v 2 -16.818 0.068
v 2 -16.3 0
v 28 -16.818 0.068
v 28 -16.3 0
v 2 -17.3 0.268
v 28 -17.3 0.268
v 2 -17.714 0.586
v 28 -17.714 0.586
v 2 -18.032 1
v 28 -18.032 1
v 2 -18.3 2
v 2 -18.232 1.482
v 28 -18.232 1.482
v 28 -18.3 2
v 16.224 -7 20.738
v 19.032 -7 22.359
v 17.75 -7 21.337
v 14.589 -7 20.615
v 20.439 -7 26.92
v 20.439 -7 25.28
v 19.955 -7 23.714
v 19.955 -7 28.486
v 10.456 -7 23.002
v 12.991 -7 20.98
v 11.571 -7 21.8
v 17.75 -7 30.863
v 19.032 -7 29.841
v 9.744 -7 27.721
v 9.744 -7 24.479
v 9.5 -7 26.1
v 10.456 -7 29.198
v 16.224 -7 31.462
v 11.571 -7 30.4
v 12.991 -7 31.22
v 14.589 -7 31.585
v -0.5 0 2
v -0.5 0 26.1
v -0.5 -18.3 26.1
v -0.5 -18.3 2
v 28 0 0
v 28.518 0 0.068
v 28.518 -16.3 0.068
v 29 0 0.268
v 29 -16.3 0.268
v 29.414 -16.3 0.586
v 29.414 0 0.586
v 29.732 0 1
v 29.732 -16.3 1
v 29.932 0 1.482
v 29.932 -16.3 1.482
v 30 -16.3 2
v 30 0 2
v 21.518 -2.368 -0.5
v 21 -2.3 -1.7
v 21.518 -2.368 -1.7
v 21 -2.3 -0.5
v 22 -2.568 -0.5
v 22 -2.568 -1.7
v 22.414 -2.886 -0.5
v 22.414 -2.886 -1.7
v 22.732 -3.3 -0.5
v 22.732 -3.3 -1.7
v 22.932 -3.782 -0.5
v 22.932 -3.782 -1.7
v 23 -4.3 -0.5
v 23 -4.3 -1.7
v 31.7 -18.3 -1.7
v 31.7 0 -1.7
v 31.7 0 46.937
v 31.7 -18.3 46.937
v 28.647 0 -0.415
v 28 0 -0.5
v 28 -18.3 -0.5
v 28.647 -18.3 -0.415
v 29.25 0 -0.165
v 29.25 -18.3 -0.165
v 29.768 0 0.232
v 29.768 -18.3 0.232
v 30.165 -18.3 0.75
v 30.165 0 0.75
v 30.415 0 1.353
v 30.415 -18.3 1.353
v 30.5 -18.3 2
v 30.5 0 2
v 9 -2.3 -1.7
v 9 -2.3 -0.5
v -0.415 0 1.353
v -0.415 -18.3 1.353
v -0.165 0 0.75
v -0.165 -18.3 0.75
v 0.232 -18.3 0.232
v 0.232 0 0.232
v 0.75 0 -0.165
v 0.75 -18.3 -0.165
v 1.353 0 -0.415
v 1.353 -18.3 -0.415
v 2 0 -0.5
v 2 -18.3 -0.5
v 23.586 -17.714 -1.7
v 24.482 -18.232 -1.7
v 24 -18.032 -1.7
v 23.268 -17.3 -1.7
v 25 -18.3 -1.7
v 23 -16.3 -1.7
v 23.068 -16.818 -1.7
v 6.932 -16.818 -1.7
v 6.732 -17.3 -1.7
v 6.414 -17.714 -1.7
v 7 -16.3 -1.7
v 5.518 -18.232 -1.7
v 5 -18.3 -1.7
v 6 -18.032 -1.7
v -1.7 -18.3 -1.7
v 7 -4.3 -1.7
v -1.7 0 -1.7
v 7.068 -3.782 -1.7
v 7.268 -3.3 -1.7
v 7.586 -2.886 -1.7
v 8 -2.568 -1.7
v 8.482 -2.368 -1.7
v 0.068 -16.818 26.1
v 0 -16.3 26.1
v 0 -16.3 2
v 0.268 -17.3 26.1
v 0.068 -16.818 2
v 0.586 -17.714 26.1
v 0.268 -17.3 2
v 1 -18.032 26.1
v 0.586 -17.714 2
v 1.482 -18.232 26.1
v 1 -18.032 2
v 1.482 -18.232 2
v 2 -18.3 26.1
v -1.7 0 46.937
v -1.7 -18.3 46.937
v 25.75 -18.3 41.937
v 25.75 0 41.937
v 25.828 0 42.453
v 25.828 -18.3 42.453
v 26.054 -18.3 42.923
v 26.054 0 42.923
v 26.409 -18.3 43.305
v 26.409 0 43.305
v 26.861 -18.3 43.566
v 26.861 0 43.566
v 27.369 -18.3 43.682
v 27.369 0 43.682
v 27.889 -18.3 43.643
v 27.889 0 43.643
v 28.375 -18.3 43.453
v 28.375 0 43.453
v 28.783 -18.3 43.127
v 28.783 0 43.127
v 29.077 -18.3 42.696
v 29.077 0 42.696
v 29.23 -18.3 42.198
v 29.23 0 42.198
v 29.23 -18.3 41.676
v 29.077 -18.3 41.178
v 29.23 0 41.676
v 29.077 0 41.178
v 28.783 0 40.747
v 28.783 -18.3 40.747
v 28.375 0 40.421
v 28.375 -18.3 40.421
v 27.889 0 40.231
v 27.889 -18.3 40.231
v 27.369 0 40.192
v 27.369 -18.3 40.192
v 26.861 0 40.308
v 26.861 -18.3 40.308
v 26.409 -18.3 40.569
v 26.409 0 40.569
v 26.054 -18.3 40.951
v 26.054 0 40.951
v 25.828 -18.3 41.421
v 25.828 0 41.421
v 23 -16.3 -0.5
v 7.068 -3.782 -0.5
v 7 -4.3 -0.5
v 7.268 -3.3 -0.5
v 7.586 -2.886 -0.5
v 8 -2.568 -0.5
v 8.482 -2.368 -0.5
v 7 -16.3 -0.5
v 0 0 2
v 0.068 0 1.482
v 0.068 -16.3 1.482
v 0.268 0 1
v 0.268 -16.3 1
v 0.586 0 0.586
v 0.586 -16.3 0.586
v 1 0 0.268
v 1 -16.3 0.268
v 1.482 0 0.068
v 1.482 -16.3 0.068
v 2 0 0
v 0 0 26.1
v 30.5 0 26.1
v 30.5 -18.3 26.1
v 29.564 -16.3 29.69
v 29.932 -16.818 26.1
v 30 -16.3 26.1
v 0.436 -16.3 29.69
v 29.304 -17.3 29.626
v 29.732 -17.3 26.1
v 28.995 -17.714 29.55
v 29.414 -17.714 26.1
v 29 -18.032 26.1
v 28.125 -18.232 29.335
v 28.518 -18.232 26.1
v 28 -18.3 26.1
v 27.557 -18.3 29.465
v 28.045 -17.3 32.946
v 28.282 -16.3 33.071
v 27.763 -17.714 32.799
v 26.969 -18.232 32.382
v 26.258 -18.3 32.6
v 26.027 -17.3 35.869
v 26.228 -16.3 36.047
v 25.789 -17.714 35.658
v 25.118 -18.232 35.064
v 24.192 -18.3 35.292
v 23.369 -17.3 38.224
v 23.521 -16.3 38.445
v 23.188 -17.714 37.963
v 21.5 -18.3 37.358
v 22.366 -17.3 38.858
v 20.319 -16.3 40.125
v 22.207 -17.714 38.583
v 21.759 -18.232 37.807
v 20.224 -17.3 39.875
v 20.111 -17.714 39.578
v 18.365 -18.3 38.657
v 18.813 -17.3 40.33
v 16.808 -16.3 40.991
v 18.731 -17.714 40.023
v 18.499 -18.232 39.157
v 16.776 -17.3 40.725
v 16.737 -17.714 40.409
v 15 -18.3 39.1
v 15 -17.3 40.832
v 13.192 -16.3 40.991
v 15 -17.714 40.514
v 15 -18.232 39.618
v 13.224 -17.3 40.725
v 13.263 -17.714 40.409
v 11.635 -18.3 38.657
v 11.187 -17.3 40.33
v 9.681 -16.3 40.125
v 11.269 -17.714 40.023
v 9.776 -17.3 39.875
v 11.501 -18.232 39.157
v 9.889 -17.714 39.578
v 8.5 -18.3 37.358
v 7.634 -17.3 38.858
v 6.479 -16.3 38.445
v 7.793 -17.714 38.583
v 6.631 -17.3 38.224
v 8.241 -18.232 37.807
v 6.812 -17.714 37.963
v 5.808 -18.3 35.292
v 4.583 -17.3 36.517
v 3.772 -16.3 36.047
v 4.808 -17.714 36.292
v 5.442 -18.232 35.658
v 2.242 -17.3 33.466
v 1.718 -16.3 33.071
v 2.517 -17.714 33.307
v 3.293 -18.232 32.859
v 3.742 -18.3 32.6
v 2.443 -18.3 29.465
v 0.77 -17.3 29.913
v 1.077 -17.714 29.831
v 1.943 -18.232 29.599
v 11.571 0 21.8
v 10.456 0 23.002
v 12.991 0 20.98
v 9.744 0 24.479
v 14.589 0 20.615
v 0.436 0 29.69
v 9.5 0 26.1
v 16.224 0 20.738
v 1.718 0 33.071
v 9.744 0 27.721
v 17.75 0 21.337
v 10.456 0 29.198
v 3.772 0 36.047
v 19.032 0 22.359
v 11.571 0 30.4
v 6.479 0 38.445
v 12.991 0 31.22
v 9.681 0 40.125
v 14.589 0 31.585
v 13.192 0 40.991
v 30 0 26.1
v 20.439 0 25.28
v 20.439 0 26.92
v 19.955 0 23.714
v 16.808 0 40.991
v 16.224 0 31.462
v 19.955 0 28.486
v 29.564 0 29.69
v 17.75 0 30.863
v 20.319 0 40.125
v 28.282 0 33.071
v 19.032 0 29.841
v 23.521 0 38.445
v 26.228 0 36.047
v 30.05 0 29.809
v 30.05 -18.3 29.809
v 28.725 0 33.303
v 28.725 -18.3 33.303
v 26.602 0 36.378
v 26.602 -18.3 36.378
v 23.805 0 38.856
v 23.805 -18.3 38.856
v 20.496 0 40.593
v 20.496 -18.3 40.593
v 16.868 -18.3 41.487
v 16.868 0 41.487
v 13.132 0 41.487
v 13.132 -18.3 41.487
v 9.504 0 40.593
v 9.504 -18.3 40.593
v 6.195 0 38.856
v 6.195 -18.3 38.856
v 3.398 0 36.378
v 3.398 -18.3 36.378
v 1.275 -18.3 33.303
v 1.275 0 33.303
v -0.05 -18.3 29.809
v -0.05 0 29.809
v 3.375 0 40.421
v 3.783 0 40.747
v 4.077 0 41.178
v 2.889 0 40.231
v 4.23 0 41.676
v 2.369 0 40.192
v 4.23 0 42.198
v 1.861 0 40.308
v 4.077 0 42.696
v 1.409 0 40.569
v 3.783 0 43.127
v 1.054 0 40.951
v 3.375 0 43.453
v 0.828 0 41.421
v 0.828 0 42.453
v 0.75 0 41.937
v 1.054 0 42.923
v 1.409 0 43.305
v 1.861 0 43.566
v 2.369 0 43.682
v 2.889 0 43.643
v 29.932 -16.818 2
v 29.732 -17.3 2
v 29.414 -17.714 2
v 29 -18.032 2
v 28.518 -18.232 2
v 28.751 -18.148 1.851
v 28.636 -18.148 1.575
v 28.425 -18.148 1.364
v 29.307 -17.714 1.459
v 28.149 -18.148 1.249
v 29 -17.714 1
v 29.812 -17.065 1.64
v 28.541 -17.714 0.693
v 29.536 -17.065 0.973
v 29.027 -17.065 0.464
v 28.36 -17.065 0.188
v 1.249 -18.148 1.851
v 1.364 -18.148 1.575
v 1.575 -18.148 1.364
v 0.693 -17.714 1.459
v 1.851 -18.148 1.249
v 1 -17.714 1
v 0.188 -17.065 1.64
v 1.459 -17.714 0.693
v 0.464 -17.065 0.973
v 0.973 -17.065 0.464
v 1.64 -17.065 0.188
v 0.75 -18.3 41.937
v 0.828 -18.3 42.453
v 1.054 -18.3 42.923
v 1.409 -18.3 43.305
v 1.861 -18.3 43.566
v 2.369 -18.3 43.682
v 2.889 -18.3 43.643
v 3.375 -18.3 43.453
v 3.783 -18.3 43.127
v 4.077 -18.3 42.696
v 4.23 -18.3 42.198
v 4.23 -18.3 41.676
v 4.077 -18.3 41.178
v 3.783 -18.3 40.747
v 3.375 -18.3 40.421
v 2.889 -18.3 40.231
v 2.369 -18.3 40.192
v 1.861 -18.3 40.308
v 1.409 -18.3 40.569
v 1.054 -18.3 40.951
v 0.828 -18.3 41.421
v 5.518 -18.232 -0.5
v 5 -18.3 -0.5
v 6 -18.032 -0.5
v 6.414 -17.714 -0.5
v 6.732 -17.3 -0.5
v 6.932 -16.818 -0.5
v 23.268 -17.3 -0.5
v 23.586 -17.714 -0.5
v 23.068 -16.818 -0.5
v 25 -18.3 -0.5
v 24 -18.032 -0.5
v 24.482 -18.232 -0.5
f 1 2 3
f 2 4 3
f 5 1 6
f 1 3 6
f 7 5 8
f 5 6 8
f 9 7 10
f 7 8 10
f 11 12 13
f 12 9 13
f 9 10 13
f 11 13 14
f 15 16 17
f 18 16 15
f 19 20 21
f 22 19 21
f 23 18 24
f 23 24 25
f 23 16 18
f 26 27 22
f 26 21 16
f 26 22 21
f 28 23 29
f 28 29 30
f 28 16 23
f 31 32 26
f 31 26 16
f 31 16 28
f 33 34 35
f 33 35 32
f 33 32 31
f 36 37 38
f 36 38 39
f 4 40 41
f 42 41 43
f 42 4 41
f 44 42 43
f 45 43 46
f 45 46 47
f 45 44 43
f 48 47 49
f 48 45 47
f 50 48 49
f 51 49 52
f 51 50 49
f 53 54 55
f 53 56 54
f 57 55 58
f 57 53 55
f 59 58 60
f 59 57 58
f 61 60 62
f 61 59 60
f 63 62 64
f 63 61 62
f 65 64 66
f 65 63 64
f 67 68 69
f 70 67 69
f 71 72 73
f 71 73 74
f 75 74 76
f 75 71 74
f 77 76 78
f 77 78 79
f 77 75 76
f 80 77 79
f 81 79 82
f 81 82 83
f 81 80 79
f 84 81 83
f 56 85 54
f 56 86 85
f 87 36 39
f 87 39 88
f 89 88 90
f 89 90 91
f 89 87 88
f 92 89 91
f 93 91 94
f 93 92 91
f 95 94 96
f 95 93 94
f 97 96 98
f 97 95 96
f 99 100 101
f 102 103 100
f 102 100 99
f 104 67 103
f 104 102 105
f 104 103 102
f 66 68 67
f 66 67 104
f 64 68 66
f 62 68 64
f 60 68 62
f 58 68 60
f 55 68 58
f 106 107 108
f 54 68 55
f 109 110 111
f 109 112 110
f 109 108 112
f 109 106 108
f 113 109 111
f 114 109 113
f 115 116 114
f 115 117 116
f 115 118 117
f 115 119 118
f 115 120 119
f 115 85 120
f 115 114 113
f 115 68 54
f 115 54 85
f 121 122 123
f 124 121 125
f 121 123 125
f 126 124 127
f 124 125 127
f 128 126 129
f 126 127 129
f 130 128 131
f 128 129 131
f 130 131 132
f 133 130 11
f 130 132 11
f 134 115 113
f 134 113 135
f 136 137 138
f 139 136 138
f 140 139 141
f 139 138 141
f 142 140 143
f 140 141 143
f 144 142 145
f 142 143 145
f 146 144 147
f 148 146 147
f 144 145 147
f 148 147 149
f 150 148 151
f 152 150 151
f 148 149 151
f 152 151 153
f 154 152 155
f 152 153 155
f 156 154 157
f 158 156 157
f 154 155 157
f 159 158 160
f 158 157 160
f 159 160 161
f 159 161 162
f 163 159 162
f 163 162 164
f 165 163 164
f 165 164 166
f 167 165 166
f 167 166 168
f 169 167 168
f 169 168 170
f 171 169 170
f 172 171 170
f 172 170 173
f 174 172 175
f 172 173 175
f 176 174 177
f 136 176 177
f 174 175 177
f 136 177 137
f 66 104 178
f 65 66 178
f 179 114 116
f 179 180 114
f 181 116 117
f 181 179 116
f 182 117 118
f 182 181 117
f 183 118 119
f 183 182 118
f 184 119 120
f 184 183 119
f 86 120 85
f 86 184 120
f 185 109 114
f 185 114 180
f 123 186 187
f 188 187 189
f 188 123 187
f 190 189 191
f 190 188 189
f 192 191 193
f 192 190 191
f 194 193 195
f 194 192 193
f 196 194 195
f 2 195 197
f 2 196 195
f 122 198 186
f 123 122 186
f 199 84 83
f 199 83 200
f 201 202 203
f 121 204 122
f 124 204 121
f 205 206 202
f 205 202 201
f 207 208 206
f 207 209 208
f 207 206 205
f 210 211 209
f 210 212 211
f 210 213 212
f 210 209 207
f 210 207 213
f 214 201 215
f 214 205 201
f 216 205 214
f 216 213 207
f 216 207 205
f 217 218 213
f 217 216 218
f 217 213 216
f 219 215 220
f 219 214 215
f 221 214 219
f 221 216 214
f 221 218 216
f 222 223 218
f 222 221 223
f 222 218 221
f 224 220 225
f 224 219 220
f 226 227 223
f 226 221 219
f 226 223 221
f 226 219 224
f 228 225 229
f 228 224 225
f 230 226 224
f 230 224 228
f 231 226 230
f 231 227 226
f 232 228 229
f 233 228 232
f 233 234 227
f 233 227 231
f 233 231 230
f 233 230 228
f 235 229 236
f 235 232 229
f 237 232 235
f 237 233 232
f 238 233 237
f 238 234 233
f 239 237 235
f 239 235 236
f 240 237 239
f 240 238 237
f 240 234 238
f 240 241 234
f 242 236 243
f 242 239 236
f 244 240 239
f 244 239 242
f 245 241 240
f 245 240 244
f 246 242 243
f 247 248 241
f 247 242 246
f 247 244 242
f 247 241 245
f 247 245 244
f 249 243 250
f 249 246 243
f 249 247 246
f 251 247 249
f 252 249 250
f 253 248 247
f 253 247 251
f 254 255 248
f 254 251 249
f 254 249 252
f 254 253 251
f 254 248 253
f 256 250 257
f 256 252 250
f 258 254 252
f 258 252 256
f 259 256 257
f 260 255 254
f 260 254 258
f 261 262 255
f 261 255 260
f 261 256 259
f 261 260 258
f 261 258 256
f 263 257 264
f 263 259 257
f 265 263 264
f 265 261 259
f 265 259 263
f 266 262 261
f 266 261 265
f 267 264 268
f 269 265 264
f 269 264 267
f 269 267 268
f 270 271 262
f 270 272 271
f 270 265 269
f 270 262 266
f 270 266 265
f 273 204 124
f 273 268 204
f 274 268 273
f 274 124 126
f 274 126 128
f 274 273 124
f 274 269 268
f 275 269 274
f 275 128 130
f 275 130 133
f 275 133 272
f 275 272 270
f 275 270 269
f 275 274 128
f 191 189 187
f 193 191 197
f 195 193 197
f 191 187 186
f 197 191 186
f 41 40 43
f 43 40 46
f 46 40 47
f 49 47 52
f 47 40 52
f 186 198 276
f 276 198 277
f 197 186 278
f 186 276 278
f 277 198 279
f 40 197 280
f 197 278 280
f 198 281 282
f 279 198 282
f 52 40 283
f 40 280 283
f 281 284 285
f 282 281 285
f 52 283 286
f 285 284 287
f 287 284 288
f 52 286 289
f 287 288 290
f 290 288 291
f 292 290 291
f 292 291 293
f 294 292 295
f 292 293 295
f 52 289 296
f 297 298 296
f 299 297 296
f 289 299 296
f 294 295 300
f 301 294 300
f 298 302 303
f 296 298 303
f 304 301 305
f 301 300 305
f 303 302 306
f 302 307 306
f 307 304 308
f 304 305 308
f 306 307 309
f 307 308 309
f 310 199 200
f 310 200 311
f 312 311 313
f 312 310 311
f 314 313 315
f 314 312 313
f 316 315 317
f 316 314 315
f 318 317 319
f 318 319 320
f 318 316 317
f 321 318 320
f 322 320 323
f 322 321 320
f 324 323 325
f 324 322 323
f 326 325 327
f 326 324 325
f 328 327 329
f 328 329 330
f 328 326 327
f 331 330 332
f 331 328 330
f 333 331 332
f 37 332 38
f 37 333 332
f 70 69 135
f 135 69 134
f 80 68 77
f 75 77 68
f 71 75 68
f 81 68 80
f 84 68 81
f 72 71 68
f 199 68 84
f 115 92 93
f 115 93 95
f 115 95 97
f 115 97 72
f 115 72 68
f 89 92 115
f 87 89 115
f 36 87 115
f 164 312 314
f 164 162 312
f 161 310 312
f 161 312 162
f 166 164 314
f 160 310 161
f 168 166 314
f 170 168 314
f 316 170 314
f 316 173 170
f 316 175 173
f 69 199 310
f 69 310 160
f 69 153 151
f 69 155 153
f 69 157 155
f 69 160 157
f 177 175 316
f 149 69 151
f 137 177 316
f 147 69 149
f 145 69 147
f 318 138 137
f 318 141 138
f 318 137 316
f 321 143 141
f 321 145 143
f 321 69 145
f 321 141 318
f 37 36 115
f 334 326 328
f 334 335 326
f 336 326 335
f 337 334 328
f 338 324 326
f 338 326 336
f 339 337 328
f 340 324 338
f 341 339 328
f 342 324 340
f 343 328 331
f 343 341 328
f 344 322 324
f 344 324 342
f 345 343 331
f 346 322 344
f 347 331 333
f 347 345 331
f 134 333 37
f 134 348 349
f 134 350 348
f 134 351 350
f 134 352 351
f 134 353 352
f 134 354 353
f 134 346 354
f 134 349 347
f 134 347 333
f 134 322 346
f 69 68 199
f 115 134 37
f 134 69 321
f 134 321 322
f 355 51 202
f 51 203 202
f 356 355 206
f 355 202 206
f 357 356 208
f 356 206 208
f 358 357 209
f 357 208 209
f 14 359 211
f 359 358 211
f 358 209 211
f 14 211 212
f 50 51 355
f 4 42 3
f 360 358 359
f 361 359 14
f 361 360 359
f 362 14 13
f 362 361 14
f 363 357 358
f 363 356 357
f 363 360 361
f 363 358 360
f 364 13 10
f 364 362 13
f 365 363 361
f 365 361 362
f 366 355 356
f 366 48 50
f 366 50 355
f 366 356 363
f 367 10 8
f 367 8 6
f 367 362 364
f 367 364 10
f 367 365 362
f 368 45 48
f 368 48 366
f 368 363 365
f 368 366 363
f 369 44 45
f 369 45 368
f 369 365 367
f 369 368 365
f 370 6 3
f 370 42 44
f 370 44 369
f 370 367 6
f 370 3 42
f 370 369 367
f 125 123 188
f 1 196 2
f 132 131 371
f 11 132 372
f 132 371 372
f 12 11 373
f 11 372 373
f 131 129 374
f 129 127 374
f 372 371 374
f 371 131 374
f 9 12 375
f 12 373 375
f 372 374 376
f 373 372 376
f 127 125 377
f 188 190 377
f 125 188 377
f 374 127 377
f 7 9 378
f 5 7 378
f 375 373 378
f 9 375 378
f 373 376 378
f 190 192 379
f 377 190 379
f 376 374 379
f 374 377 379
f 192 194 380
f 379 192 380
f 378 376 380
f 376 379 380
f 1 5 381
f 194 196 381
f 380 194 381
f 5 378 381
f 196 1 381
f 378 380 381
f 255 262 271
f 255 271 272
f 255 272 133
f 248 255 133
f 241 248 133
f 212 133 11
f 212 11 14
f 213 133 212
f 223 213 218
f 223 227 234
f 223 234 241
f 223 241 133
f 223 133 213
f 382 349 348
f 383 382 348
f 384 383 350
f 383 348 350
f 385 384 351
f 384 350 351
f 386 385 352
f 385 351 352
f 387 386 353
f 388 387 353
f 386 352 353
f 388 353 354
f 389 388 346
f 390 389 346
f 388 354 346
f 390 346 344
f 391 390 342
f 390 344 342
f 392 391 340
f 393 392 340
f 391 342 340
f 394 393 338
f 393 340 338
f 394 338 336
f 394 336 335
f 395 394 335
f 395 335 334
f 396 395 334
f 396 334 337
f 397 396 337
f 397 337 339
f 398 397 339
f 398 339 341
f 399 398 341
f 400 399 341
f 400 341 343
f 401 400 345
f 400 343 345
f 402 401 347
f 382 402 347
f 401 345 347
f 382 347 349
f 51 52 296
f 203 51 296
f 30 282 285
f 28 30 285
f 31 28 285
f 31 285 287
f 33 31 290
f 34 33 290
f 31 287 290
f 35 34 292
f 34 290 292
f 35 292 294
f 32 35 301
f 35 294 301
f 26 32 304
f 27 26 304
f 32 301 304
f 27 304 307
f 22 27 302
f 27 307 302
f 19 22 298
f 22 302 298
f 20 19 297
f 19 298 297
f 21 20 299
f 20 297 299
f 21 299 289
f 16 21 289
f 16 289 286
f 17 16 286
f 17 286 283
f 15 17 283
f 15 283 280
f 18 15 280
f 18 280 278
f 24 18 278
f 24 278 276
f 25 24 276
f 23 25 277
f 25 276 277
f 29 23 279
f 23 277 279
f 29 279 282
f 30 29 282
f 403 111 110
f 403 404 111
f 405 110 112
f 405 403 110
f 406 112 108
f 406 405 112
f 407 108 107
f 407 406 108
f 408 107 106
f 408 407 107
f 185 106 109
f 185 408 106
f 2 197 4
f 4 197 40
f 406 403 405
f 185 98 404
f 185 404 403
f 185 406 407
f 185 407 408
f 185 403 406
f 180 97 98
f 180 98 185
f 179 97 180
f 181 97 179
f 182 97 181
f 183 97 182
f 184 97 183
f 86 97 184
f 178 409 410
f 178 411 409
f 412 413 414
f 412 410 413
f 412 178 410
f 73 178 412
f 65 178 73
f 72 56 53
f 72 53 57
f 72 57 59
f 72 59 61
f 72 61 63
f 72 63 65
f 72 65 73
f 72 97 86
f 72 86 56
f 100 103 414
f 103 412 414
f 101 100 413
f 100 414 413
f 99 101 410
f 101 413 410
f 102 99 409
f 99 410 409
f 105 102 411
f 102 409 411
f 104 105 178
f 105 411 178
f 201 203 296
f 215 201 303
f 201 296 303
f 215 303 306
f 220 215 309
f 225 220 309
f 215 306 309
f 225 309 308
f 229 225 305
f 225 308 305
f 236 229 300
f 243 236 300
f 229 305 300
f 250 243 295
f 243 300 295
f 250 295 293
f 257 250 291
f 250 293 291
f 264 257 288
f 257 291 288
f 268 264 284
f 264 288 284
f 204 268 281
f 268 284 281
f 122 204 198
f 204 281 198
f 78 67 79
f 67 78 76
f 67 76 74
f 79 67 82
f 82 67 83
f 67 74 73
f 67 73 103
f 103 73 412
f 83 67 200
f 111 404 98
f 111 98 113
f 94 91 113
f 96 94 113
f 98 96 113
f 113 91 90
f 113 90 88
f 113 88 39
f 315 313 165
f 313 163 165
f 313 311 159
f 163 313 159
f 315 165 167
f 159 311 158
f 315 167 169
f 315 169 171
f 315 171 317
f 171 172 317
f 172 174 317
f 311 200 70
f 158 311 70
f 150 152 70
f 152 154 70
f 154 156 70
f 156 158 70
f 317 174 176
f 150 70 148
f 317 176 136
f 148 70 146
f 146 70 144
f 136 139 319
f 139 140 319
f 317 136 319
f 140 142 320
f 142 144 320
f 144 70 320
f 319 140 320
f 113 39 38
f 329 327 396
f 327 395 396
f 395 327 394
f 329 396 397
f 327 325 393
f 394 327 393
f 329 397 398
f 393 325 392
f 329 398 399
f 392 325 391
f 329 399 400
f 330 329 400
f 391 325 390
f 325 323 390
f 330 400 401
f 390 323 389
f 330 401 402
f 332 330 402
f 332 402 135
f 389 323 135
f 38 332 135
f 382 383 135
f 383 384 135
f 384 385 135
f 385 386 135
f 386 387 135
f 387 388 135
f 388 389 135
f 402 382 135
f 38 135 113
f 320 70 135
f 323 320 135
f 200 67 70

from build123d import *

# Parameters (mm, degrees)
F1_DEPTH = 18.3
F2_R     = 2
F3_R     = 5.5
F4_DEPTH = 7
F5_W     = 33.4
F5_H     = 48.636966
F5_R     = 1.75
F6_DEPTH = 18.3
F7_W     = 16
F7_H     = 1.2
F8_DEPTH = 16
F9_R     = 2


with BuildPart() as f1:
    # F0 (on Front) → F1 (new body)
    with BuildSketch(Plane.XZ):
        with BuildLine():
            Line((0, 26.1), (0, 0))
            Line((0, 0), (30, 0))
            Line((30, 0), (30, 26.1))
            ThreePointArc((30, 26.1), (15, 41.1), (0, 26.1))
        make_face()
    extrude(amount=F1_DEPTH)

    # F2
    f2_edges = [f1.edges().sort_by_distance(p)[0] for p in [
        (30, -9.15, 0),
        (0, -9.15, 0),
        (0, -18.3, 13.05),
        (15, -18.3, 0),
        (30, -18.3, 13.05),
        (15, -18.3, 41.1),
    ]]
    fillet(f2_edges, radius=F2_R)

    # F3 (on face) → F4 (cut)
    with BuildSketch(Plane(origin=(0, 0, 0), x_dir=(-1, 0, 0), z_dir=(0, 1, 0))):
        with Locations((-15, 26.1)):
            Circle(F3_R)
    extrude(amount=-F4_DEPTH, mode=Mode.SUBTRACT)


with BuildPart() as f6:
    # F5 (on face) → F6 (new body, through all)
    with BuildSketch(Plane(origin=(0, 0, 0), x_dir=(-1, 0, 0), z_dir=(0, 1, 0))):
        with Locations((-15, 22.618483)):
            Rectangle(F5_W, F5_H)
        with BuildLine():
            Line((-30.5, 2), (-30.5, 26.1))
            ThreePointArc((-30.5, 26.1), (-15, 41.6), (0.5, 26.1))
            Line((0.5, 26.1), (0.5, 2))
            ThreePointArc((0.5, 2), (-0.232233, 0.232233), (-2, -0.5))
            Line((-2, -0.5), (-28, -0.5))
            ThreePointArc((-28, -0.5), (-29.767767, 0.232233), (-30.5, 2))
        make_face(mode=Mode.SUBTRACT)
        with Locations((-27.5, 41.936966)):
            Circle(F5_R, mode=Mode.SUBTRACT)
        with Locations((-2.5, 41.936966)):
            Circle(F5_R, mode=Mode.SUBTRACT)
    extrude(amount=-F6_DEPTH)

    # F7 (on face) → F8 (cut)
    with BuildSketch(Plane.XZ.offset(18.3)):
        with Locations((15, -1.1)):
            Rectangle(F7_W, F7_H)
    extrude(amount=-F8_DEPTH, mode=Mode.SUBTRACT)

    # F9
    f9_edges = [f6.edges().sort_by_distance(p)[0] for p in [
        (7, -18.3, -1.1),
        (23, -18.3, -1.1),
        (7, -2.3, -1.1),
        (23, -2.3, -1.1),
    ]]
    fillet(f9_edges, radius=F9_R)


solid = Compound([f1.part, f6.part])
